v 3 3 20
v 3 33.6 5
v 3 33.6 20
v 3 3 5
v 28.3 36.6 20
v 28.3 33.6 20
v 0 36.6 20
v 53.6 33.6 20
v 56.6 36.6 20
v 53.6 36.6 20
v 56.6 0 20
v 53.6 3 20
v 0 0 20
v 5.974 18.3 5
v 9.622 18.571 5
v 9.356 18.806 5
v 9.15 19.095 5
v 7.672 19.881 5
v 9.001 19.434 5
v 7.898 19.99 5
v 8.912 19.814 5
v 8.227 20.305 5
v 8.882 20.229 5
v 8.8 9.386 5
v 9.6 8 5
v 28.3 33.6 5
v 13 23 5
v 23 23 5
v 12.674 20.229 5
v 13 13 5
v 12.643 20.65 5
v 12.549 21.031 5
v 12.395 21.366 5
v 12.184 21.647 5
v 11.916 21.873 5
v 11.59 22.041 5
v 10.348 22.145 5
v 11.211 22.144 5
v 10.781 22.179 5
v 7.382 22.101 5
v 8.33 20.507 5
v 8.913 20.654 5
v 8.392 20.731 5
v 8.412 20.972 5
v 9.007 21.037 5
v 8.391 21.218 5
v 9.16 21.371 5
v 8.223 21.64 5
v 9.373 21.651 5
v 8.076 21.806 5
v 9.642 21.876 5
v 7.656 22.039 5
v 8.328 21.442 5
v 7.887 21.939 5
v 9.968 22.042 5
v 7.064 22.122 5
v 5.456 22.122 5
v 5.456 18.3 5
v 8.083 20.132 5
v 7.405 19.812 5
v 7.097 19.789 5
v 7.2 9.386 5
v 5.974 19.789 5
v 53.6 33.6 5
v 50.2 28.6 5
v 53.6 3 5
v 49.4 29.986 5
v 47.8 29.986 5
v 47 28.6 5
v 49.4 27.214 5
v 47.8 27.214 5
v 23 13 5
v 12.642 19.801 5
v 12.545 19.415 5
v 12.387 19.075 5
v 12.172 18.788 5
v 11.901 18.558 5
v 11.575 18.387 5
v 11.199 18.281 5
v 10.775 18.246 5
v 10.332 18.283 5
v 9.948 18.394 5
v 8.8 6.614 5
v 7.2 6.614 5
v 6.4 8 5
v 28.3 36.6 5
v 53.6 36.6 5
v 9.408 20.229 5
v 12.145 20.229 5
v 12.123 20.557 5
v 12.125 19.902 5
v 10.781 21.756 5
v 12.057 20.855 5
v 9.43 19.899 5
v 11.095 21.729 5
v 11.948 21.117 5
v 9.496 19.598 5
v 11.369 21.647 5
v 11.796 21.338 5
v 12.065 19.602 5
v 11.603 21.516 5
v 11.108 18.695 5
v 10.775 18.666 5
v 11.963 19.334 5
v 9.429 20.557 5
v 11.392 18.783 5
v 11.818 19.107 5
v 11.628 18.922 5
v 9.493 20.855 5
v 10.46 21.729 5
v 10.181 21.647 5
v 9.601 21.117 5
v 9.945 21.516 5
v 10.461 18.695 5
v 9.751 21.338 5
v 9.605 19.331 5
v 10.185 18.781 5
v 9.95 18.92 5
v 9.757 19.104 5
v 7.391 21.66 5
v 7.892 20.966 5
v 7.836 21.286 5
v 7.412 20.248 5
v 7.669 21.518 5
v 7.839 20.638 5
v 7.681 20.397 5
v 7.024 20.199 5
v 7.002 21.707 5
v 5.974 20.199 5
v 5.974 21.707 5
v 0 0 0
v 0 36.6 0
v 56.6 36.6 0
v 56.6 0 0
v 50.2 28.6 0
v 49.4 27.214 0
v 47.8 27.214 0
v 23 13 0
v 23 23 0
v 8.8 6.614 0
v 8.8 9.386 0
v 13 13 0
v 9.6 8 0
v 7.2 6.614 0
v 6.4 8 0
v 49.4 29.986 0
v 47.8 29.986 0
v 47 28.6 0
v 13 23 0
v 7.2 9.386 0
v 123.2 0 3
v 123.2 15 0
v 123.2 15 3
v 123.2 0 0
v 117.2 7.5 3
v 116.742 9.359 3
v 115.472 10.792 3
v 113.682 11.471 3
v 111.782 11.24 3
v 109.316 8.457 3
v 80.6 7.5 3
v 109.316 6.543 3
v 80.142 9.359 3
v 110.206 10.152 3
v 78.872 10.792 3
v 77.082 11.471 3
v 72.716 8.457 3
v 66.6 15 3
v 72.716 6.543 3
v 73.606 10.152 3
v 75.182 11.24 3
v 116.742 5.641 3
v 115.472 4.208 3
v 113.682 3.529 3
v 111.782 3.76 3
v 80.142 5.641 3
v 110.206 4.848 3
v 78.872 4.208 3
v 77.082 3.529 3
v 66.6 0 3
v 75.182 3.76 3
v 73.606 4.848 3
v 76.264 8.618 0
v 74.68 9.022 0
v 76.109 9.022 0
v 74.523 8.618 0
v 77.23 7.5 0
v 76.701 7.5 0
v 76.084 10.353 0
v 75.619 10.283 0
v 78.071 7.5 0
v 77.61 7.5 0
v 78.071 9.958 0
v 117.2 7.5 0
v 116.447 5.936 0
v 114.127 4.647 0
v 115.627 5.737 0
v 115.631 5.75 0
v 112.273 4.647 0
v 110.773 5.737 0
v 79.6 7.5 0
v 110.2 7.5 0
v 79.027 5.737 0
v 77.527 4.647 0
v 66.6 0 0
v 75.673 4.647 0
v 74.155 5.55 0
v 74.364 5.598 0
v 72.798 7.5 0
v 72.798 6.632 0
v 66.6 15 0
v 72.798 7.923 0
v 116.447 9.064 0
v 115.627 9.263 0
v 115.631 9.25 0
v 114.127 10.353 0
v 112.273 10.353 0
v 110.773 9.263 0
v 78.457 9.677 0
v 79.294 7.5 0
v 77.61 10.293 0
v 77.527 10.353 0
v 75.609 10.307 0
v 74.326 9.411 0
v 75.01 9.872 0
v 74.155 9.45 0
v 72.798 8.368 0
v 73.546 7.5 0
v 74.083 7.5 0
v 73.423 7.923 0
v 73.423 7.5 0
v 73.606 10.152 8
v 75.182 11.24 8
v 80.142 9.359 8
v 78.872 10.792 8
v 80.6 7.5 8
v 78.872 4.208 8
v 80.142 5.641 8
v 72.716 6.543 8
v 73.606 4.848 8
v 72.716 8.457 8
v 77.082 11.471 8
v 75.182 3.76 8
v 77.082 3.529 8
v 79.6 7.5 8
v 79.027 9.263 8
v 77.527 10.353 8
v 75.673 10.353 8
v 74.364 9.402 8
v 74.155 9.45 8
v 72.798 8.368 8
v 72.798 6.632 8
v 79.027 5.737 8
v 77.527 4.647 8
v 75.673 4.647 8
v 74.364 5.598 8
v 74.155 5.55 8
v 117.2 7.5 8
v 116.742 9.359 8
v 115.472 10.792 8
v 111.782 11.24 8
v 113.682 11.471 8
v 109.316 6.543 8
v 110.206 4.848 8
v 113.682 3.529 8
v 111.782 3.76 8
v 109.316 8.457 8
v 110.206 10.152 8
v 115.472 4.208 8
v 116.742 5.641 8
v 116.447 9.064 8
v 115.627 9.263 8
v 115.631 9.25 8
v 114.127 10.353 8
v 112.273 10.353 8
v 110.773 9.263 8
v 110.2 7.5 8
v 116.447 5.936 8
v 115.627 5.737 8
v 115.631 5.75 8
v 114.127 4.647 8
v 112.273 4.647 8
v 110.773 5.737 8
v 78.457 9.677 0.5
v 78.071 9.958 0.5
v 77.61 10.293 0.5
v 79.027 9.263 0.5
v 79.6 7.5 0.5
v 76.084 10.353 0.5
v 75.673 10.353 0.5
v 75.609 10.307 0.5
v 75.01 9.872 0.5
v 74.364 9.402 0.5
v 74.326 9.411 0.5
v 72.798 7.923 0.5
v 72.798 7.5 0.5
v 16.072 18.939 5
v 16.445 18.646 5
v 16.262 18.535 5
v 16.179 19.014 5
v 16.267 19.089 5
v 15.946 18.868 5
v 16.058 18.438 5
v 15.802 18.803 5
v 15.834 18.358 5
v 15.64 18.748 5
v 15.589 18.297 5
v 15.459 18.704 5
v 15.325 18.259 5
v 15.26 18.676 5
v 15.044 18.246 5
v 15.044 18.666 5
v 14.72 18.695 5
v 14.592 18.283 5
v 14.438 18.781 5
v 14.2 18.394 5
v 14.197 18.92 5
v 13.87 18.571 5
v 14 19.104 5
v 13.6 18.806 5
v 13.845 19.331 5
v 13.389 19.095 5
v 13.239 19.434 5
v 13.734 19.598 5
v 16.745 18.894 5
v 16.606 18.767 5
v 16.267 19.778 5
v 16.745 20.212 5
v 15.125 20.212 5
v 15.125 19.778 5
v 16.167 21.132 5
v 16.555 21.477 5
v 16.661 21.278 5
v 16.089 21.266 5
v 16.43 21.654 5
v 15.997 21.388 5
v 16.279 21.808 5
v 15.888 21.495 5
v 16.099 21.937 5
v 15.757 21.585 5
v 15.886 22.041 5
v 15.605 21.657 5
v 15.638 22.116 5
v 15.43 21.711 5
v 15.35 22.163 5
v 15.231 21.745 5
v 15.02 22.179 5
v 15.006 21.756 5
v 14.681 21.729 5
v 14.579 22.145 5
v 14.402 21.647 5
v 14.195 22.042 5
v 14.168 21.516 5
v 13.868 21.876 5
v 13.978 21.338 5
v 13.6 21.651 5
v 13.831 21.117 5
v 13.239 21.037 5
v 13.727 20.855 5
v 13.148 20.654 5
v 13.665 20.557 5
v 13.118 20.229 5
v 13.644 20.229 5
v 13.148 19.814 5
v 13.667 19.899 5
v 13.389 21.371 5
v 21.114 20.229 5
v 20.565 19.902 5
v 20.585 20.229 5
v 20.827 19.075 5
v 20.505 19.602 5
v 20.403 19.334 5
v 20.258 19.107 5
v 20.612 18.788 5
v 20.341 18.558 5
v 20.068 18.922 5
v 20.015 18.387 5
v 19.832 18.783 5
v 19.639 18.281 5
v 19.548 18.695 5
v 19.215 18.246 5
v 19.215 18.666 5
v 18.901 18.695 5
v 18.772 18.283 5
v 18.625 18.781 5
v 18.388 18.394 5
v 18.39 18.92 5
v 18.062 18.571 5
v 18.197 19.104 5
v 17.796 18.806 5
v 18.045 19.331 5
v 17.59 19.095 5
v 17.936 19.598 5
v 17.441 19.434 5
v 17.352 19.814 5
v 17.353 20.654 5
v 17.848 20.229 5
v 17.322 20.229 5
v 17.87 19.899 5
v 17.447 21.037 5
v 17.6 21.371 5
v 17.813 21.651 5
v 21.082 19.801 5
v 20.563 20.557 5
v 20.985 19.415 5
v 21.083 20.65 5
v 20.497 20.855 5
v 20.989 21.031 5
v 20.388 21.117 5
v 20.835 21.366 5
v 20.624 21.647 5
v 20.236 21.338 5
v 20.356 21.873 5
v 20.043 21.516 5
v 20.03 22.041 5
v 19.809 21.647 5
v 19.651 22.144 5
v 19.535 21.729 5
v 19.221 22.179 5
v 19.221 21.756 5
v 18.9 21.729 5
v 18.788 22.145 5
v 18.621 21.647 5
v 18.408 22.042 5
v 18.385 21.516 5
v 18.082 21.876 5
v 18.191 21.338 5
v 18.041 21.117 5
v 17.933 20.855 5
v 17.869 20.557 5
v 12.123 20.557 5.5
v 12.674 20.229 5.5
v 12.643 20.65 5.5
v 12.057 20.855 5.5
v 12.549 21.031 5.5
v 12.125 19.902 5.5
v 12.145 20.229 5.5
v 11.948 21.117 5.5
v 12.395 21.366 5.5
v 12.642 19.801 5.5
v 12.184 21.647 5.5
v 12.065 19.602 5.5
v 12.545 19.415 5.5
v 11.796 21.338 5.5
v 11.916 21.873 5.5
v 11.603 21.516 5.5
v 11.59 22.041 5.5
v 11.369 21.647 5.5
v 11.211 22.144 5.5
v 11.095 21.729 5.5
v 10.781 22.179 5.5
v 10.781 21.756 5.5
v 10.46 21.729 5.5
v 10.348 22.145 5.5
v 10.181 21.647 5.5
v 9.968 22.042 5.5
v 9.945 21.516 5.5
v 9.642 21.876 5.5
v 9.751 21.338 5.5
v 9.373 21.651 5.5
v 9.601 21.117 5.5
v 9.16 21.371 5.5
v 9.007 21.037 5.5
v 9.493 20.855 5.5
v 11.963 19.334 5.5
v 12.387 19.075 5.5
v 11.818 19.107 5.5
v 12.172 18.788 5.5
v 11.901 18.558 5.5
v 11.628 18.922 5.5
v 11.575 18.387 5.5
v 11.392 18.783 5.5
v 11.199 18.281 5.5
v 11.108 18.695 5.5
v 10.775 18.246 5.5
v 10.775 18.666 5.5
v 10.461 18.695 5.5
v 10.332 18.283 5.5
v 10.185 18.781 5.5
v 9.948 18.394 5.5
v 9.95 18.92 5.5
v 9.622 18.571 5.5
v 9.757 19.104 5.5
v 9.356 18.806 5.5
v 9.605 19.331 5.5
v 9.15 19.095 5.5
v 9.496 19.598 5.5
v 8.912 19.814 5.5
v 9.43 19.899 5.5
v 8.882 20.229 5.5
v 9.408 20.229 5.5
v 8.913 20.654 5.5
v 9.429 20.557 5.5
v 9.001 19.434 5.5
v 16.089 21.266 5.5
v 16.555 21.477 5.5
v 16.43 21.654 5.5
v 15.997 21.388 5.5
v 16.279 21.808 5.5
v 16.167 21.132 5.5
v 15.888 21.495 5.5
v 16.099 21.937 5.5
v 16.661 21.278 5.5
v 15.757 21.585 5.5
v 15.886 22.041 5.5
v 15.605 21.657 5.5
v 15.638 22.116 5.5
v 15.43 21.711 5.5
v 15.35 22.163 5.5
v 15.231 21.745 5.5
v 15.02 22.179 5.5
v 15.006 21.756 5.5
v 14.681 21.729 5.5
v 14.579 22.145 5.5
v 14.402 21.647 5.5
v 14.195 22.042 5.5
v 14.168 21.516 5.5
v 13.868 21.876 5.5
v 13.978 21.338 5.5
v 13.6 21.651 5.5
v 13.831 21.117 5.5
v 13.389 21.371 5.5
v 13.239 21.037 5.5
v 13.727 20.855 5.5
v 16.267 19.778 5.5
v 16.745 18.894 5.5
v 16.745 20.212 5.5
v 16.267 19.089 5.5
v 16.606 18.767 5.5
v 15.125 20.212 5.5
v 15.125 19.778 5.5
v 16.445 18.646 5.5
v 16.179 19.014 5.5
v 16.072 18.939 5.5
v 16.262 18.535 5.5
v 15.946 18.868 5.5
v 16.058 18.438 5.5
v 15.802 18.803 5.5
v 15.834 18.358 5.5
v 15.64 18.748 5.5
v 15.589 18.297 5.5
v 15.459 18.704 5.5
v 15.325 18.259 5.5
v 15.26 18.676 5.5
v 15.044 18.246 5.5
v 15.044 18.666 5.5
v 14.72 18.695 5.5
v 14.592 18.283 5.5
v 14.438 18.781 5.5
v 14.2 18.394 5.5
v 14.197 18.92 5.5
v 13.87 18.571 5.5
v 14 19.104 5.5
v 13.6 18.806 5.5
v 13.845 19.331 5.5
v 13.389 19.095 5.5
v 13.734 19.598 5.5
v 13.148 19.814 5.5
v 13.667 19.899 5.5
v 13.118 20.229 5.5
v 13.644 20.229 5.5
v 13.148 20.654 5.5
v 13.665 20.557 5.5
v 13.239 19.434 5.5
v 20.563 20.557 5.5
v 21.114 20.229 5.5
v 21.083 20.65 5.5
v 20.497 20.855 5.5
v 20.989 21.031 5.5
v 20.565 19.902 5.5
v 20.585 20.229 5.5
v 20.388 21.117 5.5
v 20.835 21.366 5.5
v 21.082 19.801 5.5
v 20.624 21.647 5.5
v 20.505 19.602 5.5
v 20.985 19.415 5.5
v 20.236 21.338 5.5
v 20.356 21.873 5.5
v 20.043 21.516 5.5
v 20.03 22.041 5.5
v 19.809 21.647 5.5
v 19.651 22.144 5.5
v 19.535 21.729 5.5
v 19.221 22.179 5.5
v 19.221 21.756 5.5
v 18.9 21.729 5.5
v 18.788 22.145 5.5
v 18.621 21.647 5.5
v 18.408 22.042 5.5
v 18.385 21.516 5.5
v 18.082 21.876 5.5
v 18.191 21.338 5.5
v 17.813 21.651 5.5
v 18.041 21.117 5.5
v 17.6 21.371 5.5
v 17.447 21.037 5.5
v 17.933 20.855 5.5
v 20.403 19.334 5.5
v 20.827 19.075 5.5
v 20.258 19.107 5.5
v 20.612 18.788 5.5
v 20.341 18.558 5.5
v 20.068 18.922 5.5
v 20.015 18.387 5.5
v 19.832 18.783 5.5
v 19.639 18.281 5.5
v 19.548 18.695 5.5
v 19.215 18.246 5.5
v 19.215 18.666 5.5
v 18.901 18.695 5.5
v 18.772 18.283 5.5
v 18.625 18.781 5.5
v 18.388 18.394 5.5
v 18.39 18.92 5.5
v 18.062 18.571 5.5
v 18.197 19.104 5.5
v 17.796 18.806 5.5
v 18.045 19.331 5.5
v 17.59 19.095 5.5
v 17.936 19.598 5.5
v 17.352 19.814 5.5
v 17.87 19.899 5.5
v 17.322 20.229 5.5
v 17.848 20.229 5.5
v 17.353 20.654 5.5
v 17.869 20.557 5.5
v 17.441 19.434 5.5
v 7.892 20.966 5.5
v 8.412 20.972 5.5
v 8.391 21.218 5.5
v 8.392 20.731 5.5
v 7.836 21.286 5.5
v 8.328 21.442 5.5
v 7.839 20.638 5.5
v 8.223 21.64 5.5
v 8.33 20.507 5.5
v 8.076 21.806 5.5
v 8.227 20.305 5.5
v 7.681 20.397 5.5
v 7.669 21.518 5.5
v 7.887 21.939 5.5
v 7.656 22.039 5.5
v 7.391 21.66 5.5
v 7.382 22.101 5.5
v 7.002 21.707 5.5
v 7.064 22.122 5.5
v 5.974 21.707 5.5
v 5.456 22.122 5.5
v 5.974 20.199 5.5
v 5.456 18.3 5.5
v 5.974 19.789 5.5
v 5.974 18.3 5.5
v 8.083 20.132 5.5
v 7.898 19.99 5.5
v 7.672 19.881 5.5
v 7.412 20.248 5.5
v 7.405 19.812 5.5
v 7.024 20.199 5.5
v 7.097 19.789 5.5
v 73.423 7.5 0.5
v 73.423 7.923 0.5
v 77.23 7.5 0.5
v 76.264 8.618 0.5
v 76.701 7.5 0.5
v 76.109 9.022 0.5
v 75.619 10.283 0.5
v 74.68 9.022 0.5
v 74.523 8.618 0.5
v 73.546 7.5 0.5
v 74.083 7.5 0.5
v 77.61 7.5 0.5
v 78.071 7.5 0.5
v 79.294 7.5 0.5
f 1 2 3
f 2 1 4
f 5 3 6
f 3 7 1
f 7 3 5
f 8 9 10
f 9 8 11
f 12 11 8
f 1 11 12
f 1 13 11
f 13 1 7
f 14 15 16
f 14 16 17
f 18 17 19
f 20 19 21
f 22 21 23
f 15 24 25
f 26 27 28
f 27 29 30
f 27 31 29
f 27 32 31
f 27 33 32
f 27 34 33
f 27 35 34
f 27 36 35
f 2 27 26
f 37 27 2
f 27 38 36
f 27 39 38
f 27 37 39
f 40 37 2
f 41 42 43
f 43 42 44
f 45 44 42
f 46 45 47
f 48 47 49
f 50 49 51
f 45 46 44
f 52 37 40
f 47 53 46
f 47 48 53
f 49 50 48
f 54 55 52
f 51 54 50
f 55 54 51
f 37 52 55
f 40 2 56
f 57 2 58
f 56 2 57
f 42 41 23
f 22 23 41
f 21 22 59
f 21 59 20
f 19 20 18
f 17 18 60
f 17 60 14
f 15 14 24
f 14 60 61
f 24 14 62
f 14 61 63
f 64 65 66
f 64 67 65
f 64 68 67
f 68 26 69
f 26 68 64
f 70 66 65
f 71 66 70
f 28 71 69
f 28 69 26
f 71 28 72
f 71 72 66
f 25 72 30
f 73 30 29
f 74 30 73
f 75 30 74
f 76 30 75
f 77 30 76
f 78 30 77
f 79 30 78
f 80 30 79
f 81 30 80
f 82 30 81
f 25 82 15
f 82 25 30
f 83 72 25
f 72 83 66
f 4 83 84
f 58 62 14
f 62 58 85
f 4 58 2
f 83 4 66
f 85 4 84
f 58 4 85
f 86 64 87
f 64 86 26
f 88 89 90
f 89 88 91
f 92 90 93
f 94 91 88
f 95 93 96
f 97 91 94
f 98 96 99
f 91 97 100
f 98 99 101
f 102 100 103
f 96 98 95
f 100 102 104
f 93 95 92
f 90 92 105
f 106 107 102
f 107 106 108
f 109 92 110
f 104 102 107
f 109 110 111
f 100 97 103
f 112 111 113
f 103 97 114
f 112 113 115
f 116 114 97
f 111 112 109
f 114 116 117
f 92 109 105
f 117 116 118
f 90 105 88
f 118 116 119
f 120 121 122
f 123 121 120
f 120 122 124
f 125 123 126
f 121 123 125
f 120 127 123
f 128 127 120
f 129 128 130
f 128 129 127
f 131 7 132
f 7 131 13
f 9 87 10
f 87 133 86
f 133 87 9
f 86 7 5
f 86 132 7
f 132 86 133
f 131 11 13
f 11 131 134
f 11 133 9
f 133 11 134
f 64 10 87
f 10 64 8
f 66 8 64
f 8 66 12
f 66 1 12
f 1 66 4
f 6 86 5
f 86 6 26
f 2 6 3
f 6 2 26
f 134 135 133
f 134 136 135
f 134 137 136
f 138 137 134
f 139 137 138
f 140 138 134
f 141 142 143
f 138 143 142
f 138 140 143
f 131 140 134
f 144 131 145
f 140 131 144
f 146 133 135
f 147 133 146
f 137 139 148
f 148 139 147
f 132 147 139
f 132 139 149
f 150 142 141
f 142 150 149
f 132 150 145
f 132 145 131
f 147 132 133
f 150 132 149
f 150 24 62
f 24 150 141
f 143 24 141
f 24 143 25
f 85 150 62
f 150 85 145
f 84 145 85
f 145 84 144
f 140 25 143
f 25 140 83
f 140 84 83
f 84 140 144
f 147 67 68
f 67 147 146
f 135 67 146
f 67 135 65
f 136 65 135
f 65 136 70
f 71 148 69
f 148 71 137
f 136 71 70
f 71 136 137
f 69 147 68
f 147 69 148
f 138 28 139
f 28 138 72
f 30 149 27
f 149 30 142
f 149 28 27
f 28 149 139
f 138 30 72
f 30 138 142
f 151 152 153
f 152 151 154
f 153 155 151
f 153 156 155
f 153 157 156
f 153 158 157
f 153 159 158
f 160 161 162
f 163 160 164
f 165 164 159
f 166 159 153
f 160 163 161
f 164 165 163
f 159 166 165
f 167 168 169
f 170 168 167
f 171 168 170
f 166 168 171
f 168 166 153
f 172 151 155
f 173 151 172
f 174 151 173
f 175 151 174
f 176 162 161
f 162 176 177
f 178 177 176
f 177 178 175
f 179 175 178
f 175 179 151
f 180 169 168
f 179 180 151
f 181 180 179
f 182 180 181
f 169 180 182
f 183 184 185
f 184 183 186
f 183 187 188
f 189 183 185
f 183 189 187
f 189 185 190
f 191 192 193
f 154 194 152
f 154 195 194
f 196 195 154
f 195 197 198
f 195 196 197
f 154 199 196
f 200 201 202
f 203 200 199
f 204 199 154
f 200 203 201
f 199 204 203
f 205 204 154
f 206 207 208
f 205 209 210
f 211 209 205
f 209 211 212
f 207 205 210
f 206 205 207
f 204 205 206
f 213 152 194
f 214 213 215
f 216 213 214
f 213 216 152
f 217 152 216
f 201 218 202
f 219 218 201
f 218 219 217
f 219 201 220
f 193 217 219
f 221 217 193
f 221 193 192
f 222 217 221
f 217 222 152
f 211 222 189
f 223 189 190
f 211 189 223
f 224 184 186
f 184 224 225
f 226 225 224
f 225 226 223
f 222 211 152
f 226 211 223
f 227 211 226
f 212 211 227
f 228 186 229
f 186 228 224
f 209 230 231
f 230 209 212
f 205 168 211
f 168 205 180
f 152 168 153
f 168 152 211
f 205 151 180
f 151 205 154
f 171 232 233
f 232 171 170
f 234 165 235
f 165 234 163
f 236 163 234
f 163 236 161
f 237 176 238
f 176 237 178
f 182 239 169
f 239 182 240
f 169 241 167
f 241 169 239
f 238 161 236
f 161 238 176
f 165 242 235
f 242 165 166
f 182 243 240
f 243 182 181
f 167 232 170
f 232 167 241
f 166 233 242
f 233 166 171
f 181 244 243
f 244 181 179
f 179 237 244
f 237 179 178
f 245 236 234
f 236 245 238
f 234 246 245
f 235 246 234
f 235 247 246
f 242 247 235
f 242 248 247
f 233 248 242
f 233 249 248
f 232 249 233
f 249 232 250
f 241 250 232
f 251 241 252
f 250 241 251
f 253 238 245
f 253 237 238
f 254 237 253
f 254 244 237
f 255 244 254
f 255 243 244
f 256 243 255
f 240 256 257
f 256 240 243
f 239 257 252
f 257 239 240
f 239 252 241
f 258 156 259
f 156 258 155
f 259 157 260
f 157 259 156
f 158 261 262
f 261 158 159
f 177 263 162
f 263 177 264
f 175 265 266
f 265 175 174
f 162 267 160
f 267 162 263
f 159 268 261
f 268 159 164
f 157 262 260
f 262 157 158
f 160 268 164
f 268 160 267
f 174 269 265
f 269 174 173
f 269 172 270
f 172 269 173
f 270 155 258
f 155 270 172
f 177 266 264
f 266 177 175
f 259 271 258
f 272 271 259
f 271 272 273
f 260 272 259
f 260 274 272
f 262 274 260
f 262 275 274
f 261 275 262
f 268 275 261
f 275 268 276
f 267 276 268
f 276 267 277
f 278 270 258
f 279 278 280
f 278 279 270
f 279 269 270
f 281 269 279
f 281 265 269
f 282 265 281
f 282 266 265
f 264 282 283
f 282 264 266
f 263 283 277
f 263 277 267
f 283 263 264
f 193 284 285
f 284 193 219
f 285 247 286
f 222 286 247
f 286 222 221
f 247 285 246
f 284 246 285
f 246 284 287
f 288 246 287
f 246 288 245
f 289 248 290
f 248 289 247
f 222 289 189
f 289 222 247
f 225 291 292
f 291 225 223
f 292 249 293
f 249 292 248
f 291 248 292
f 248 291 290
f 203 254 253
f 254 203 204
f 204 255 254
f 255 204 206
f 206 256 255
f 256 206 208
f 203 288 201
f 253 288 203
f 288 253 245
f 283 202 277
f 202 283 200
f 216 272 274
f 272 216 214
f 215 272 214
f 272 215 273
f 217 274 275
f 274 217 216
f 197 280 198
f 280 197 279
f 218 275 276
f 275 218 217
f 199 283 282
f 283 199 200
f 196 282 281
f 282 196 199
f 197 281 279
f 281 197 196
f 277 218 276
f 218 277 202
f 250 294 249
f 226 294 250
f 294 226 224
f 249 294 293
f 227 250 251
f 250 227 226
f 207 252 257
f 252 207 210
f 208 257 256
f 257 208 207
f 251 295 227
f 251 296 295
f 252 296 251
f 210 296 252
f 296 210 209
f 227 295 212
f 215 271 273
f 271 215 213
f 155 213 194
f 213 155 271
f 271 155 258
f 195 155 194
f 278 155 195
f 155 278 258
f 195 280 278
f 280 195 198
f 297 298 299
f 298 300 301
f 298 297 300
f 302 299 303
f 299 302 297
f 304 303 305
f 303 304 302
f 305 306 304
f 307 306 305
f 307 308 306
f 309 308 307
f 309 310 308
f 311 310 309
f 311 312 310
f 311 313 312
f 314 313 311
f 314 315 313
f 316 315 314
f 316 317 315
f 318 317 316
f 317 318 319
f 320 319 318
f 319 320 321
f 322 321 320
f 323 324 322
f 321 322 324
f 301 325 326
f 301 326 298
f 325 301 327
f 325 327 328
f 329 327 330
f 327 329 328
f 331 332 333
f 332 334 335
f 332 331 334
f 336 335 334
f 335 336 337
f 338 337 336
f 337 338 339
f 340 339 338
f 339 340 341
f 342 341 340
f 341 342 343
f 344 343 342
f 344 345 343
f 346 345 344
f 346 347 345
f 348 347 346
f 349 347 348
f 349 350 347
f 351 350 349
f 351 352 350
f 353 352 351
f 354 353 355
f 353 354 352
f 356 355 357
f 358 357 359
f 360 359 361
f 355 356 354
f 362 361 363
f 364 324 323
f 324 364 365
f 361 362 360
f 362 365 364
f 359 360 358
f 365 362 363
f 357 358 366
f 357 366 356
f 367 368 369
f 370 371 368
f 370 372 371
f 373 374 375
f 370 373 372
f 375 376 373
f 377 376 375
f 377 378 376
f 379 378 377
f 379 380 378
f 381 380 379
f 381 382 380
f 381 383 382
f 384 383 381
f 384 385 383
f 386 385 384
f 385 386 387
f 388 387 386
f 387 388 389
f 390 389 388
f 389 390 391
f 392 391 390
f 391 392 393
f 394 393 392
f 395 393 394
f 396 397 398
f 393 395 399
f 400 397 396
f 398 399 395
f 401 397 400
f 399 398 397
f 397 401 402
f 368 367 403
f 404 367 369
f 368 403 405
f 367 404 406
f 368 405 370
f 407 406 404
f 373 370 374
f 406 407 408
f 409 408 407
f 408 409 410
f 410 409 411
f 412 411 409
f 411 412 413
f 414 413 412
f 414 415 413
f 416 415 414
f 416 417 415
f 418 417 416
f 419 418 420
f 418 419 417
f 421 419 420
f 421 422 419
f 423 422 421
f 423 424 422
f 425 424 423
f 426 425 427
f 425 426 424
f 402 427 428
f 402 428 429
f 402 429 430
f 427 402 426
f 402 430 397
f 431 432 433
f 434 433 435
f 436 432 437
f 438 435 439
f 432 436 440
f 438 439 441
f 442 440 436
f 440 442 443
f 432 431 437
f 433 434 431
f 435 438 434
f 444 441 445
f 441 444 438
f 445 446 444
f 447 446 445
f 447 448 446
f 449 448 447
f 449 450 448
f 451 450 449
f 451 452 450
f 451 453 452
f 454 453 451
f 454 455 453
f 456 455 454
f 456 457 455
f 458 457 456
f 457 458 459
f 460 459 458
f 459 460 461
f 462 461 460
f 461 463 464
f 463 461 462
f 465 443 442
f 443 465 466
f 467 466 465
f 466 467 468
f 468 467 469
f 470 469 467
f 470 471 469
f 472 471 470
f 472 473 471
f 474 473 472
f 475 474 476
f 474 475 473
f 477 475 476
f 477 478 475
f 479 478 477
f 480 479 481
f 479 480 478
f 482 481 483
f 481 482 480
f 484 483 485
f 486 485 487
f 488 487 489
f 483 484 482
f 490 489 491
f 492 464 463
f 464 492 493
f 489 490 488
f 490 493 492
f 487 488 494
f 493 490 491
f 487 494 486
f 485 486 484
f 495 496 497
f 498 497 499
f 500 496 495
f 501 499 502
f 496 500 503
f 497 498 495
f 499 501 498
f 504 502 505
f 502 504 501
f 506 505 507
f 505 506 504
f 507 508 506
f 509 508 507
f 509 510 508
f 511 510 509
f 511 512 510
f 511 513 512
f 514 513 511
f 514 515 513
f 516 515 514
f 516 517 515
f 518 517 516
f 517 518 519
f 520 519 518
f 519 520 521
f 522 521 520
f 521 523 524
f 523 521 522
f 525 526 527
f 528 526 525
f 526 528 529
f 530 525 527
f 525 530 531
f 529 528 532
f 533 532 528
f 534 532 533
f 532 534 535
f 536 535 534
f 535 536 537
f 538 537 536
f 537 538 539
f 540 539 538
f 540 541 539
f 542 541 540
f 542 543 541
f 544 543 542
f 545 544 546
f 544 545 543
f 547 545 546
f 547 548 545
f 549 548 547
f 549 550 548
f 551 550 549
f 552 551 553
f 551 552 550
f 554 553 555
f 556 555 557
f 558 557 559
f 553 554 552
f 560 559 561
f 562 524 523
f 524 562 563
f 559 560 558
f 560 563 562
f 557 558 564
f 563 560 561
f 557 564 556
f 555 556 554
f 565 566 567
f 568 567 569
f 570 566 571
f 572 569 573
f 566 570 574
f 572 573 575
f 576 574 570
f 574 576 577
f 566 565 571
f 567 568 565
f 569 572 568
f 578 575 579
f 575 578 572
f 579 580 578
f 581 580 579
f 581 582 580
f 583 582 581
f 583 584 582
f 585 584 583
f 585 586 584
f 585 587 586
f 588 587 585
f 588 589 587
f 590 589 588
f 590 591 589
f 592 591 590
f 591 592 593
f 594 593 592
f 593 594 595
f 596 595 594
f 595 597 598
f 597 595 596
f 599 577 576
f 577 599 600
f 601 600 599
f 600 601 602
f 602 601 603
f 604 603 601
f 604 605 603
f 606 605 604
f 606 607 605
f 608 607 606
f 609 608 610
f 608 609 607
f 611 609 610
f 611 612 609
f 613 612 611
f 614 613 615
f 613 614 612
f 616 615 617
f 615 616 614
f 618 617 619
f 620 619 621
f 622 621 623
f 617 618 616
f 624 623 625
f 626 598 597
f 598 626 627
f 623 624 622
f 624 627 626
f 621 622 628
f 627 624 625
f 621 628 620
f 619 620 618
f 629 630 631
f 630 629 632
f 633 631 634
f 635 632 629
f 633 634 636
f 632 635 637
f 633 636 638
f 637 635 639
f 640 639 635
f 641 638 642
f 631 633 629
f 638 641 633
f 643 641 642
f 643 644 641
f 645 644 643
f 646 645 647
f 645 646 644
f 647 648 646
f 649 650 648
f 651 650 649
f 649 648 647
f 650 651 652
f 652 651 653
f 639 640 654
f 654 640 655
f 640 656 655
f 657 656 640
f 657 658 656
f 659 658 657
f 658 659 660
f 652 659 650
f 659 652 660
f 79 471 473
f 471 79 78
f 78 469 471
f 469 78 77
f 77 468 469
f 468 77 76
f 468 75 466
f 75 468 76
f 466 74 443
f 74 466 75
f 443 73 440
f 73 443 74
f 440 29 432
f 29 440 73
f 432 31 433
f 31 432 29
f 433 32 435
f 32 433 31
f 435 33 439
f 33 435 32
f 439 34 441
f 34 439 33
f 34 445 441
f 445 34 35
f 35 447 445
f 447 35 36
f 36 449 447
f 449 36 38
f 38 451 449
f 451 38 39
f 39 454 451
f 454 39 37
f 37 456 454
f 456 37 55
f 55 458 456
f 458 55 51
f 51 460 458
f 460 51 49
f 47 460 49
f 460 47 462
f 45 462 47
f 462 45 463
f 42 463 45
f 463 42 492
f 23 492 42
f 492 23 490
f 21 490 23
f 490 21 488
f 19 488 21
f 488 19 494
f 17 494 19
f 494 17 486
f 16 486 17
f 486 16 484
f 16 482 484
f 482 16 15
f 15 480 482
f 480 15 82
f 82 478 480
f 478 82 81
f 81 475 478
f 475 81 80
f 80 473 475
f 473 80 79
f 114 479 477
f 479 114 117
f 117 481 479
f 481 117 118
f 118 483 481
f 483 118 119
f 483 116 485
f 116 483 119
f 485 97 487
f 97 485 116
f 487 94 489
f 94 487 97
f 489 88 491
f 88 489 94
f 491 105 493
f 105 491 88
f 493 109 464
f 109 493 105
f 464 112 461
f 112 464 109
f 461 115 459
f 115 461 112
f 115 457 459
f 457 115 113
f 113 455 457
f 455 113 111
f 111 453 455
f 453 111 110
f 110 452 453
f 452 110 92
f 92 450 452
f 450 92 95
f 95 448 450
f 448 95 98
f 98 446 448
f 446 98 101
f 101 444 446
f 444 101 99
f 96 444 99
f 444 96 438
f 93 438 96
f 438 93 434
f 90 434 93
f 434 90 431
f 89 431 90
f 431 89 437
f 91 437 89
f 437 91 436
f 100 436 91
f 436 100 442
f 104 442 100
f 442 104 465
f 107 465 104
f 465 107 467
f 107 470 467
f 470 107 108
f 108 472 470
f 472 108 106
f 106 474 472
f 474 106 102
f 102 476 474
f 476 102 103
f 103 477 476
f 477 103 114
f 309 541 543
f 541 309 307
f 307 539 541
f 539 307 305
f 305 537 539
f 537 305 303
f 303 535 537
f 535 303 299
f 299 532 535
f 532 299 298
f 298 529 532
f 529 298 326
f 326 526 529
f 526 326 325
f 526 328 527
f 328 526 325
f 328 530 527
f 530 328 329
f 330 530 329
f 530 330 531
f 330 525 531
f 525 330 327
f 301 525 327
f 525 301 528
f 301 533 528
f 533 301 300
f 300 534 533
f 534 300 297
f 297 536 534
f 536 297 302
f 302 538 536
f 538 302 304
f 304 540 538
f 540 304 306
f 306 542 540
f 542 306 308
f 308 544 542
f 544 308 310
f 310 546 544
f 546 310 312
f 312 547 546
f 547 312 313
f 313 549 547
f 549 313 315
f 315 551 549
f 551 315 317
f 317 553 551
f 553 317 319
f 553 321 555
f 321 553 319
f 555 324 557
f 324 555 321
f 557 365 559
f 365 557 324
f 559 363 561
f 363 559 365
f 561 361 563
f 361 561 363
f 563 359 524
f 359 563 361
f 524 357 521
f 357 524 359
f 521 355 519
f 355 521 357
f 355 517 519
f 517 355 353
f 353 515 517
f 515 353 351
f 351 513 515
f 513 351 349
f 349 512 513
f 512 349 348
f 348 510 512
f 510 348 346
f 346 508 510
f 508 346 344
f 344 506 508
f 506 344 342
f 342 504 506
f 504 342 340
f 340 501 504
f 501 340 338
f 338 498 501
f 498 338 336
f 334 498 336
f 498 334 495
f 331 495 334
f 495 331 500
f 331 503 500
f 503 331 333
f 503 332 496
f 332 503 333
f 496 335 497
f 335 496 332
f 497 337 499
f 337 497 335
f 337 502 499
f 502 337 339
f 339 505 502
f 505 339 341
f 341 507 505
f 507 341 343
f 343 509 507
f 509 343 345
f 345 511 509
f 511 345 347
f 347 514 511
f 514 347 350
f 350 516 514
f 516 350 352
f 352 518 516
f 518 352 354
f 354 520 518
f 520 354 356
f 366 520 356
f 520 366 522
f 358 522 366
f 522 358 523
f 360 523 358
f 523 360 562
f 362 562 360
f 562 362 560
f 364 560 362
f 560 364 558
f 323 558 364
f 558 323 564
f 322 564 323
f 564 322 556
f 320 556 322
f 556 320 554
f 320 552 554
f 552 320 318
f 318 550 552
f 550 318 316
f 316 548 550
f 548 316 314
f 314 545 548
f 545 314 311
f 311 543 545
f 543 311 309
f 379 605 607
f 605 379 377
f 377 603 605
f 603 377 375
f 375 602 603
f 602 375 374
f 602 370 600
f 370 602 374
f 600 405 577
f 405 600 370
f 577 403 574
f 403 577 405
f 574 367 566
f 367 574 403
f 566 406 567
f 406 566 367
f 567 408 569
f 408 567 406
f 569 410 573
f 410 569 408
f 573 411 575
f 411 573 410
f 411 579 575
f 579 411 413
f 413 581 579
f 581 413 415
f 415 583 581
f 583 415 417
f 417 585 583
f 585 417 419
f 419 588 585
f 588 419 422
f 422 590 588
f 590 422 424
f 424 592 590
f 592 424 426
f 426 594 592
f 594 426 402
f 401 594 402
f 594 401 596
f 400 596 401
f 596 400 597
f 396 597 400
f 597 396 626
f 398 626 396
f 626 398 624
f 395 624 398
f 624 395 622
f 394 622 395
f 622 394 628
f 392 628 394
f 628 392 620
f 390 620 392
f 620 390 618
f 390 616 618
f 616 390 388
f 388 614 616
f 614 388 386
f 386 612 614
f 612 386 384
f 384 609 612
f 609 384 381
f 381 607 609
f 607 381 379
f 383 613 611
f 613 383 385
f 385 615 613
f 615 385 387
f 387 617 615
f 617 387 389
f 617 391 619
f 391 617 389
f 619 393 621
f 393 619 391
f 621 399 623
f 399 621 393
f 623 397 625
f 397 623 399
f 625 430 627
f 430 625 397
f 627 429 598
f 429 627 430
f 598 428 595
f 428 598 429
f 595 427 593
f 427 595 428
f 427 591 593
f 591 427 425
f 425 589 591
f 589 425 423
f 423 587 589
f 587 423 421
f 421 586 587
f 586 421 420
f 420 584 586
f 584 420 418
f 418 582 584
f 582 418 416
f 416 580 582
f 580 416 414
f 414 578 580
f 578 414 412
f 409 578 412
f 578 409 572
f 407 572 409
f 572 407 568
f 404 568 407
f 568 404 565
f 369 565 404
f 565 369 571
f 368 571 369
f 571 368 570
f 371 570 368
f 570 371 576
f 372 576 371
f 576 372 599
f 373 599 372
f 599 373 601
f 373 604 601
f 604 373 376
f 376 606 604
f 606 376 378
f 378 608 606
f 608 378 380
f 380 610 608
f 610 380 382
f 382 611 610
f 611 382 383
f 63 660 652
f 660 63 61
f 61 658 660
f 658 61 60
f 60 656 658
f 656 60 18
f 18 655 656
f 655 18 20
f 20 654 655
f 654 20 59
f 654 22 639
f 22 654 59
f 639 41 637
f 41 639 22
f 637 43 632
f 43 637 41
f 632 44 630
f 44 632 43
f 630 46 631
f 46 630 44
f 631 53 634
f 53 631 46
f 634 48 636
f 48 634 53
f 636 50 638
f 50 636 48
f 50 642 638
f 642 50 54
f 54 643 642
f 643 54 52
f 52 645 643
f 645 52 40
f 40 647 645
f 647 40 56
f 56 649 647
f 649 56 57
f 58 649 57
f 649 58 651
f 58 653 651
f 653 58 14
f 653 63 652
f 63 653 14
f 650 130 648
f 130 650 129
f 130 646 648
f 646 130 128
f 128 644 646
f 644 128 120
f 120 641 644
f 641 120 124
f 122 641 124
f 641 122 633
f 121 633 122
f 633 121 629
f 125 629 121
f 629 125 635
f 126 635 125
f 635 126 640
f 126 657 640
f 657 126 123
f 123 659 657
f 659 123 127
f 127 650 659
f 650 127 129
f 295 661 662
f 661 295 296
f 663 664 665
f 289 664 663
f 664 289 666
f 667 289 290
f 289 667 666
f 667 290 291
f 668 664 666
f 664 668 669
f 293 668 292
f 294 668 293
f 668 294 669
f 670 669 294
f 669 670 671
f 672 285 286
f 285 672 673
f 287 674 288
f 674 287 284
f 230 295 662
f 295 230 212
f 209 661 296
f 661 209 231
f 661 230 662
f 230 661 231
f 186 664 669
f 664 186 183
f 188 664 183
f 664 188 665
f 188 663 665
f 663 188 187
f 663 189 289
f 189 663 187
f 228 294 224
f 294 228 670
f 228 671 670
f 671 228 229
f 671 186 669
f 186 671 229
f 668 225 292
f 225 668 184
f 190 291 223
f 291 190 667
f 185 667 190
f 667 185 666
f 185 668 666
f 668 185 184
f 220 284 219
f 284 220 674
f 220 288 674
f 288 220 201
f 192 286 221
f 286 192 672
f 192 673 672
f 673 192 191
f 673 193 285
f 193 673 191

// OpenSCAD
// Pyr0-Piezo EasyPiezi Production Jig Alignment Fixture
// 3D printable fixture for consistent board placement
// Designed for fast insertion/removal during production runs
//
// Print settings:
// - Material: PETG or ABS (heat resistant)
// - Layer height: 0.2mm
// - Infill: 20-30%
// - Supports: Yes (for clamp mechanism)
// - Print time: ~2-3 hours

// ============================================================================
// CONFIGURATION - Adjust these to match your EasyPiezi board dimensions
// ============================================================================

// EasyPiezi board dimensions (measure your actual boards!)
board_length = 50;  // mm - adjust to actual
board_width = 30;   // mm - adjust to actual
board_thickness = 1.6;  // mm - standard PCB thickness

// Clearance and tolerances
board_clearance = 0.3;  // mm - extra space for easy insertion
alignment_pin_diameter = 3.0;  // mm - M3 alignment pins
alignment_pin_clearance = 0.2;  // mm

// Pogo pin contact area (where board must be pressed down)
pogo_contact_x = 15;  // mm from left edge - MEASURE YOUR JIG!
pogo_contact_y = 15;  // mm from bottom edge - MEASURE YOUR JIG!
pogo_contact_zone = 10;  // mm - size of contact area

// Fixture dimensions
base_thickness = 5;  // mm
wall_height = 15;  // mm - enough to guide board
wall_thickness = 3;  // mm

// Clamp mechanism
clamp_width = 15;  // mm
clamp_thickness = 3;  // mm
spring_recess_depth = 10;  // mm - for compression spring

// ============================================================================
// COMPUTED VALUES - Don't change these
// ============================================================================

inner_length = board_length + board_clearance * 2;
inner_width = board_width + board_clearance * 2;
outer_length = inner_length + wall_thickness * 2;
outer_width = inner_width + wall_thickness * 2;

// ============================================================================
// MAIN ASSEMBLY
// ============================================================================

module complete_fixture() {
    difference() {
        union() {
            // Base plate
            base_plate();

            // Alignment walls
            alignment_walls();

            // Alignment pins
            alignment_pin_holders();
        }

        // Board cavity
        board_cavity();

        // Alignment pin holes
        alignment_pin_holes();

        // Pogo pin access holes
        pogo_access_holes();
    }

    // Removable clamp (print separately)
    translate([outer_length + 10, 0, 0])
        spring_clamp();
}

// ============================================================================
// COMPONENTS
// ============================================================================

module base_plate() {
    color("lightblue")
    cube([outer_length, outer_width, base_thickness]);
}

module alignment_walls() {
    color("lightblue") {
        // Left wall
        translate([0, 0, base_thickness])
            cube([wall_thickness, outer_width, wall_height]);

        // Right wall
        translate([outer_length - wall_thickness, 0, base_thickness])
            cube([wall_thickness, outer_width, wall_height]);

        // Bottom wall
        translate([0, 0, base_thickness])
            cube([outer_length, wall_thickness, wall_height]);

        // Top wall (partial - leave opening for board insertion)
        translate([0, outer_width - wall_thickness, base_thickness])
            cube([outer_length / 2, wall_thickness, wall_height]);
    }
}

module alignment_pin_holders() {
    pin_holder_size = 8;

    color("lightblue") {
        // Left pin holder
        translate([wall_thickness + 5, wall_thickness + 5, 0])
            cylinder(d=pin_holder_size, h=base_thickness + wall_height);

        // Right pin holder
        translate([outer_length - wall_thickness - 5, outer_width - wall_thickness - 5, 0])
            cylinder(d=pin_holder_size, h=base_thickness + wall_height);
    }
}

module board_cavity() {
    color("red") {
        translate([wall_thickness, wall_thickness, base_thickness])
            cube([inner_length, inner_width, wall_height + 1]);
    }
}

module alignment_pin_holes() {
    pin_hole_diameter = alignment_pin_diameter + alignment_pin_clearance;

    color("red") {
        // Left pin hole (for M3 shoulder screw)
        translate([wall_thickness + 5, wall_thickness + 5, -1])
            cylinder(d=pin_hole_diameter, h=base_thickness + wall_height + 2);

        // Right pin hole
        translate([outer_length - wall_thickness - 5, outer_width - wall_thickness - 5, -1])
            cylinder(d=pin_hole_diameter, h=base_thickness + wall_height + 2);
    }
}

module pogo_access_holes() {
    // Cut holes in base for pogo pins to reach through
    color("red") {
        translate([wall_thickness + pogo_contact_x - pogo_contact_zone/2,
                   wall_thickness + pogo_contact_y - pogo_contact_zone/2,
                   -1])
            cube([pogo_contact_zone, pogo_contact_zone, base_thickness + 2]);
    }
}

module spring_clamp() {
    // Removable spring-loaded clamp piece
    color("orange") {
        difference() {
            union() {
                // Main clamp bar
                cube([outer_length, clamp_width, clamp_thickness]);

                // Spring pocket bosses
                translate([10, clamp_width/2, clamp_thickness])
                    cylinder(d=8, h=5);
                translate([outer_length - 10, clamp_width/2, clamp_thickness])
                    cylinder(d=8, h=5);
            }

            // Spring recesses
            translate([10, clamp_width/2, -1])
                cylinder(d=6, h=spring_recess_depth);
            translate([outer_length - 10, clamp_width/2, -1])
                cylinder(d=6, h=spring_recess_depth);

            // Alignment pin clearance holes
            translate([wall_thickness + 5, clamp_width/2, -1])
                cylinder(d=alignment_pin_diameter + 1, h=clamp_thickness + 10);
            translate([outer_length - wall_thickness - 5, clamp_width/2, -1])
                cylinder(d=alignment_pin_diameter + 1, h=clamp_thickness + 10);
        }
    }
}

// ============================================================================
// RENDER
// ============================================================================

// Render the complete fixture
complete_fixture();

// Add text labels for printing
translate([5, outer_width/2, base_thickness])
    linear_extrude(height=0.5)
        text("POGO", size=4, halign="left");

translate([outer_length + 10, clamp_width/2, 0])
    linear_extrude(height=0.5)
        text("CLAMP", size=4, halign="left");

// ============================================================================
// ASSEMBLY NOTES
// ============================================================================

/*
ASSEMBLY INSTRUCTIONS:

Hardware Required:
- 2x M3 x 16mm shoulder screws (alignment pins)
- 2x M3 nuts
- 2x compression springs (6mm OD x 10mm length)
- Optional: 4x rubber feet

Assembly Steps:
1. Print base fixture and clamp separately
2. Insert M3 shoulder screws through alignment pin holes from bottom
3. Secure with nuts on bottom (or thread into your jig base)
4. Place springs on spring bosses of clamp
5. Your programming jig should have matching holes for the alignment pins

Usage:
1. Place board on jig, align with pins
2. Press clamp down (springs compress)
3. Board makes contact with pogo pins
4. Flash firmware
5. Release clamp, remove board

ADJUSTMENT TIPS:
- If board is too loose: decrease board_clearance (line 16)
- If board is too tight: increase board_clearance
- Measure your actual board dimensions and update lines 13-15
- Measure your pogo pin positions and update lines 20-22
*/
